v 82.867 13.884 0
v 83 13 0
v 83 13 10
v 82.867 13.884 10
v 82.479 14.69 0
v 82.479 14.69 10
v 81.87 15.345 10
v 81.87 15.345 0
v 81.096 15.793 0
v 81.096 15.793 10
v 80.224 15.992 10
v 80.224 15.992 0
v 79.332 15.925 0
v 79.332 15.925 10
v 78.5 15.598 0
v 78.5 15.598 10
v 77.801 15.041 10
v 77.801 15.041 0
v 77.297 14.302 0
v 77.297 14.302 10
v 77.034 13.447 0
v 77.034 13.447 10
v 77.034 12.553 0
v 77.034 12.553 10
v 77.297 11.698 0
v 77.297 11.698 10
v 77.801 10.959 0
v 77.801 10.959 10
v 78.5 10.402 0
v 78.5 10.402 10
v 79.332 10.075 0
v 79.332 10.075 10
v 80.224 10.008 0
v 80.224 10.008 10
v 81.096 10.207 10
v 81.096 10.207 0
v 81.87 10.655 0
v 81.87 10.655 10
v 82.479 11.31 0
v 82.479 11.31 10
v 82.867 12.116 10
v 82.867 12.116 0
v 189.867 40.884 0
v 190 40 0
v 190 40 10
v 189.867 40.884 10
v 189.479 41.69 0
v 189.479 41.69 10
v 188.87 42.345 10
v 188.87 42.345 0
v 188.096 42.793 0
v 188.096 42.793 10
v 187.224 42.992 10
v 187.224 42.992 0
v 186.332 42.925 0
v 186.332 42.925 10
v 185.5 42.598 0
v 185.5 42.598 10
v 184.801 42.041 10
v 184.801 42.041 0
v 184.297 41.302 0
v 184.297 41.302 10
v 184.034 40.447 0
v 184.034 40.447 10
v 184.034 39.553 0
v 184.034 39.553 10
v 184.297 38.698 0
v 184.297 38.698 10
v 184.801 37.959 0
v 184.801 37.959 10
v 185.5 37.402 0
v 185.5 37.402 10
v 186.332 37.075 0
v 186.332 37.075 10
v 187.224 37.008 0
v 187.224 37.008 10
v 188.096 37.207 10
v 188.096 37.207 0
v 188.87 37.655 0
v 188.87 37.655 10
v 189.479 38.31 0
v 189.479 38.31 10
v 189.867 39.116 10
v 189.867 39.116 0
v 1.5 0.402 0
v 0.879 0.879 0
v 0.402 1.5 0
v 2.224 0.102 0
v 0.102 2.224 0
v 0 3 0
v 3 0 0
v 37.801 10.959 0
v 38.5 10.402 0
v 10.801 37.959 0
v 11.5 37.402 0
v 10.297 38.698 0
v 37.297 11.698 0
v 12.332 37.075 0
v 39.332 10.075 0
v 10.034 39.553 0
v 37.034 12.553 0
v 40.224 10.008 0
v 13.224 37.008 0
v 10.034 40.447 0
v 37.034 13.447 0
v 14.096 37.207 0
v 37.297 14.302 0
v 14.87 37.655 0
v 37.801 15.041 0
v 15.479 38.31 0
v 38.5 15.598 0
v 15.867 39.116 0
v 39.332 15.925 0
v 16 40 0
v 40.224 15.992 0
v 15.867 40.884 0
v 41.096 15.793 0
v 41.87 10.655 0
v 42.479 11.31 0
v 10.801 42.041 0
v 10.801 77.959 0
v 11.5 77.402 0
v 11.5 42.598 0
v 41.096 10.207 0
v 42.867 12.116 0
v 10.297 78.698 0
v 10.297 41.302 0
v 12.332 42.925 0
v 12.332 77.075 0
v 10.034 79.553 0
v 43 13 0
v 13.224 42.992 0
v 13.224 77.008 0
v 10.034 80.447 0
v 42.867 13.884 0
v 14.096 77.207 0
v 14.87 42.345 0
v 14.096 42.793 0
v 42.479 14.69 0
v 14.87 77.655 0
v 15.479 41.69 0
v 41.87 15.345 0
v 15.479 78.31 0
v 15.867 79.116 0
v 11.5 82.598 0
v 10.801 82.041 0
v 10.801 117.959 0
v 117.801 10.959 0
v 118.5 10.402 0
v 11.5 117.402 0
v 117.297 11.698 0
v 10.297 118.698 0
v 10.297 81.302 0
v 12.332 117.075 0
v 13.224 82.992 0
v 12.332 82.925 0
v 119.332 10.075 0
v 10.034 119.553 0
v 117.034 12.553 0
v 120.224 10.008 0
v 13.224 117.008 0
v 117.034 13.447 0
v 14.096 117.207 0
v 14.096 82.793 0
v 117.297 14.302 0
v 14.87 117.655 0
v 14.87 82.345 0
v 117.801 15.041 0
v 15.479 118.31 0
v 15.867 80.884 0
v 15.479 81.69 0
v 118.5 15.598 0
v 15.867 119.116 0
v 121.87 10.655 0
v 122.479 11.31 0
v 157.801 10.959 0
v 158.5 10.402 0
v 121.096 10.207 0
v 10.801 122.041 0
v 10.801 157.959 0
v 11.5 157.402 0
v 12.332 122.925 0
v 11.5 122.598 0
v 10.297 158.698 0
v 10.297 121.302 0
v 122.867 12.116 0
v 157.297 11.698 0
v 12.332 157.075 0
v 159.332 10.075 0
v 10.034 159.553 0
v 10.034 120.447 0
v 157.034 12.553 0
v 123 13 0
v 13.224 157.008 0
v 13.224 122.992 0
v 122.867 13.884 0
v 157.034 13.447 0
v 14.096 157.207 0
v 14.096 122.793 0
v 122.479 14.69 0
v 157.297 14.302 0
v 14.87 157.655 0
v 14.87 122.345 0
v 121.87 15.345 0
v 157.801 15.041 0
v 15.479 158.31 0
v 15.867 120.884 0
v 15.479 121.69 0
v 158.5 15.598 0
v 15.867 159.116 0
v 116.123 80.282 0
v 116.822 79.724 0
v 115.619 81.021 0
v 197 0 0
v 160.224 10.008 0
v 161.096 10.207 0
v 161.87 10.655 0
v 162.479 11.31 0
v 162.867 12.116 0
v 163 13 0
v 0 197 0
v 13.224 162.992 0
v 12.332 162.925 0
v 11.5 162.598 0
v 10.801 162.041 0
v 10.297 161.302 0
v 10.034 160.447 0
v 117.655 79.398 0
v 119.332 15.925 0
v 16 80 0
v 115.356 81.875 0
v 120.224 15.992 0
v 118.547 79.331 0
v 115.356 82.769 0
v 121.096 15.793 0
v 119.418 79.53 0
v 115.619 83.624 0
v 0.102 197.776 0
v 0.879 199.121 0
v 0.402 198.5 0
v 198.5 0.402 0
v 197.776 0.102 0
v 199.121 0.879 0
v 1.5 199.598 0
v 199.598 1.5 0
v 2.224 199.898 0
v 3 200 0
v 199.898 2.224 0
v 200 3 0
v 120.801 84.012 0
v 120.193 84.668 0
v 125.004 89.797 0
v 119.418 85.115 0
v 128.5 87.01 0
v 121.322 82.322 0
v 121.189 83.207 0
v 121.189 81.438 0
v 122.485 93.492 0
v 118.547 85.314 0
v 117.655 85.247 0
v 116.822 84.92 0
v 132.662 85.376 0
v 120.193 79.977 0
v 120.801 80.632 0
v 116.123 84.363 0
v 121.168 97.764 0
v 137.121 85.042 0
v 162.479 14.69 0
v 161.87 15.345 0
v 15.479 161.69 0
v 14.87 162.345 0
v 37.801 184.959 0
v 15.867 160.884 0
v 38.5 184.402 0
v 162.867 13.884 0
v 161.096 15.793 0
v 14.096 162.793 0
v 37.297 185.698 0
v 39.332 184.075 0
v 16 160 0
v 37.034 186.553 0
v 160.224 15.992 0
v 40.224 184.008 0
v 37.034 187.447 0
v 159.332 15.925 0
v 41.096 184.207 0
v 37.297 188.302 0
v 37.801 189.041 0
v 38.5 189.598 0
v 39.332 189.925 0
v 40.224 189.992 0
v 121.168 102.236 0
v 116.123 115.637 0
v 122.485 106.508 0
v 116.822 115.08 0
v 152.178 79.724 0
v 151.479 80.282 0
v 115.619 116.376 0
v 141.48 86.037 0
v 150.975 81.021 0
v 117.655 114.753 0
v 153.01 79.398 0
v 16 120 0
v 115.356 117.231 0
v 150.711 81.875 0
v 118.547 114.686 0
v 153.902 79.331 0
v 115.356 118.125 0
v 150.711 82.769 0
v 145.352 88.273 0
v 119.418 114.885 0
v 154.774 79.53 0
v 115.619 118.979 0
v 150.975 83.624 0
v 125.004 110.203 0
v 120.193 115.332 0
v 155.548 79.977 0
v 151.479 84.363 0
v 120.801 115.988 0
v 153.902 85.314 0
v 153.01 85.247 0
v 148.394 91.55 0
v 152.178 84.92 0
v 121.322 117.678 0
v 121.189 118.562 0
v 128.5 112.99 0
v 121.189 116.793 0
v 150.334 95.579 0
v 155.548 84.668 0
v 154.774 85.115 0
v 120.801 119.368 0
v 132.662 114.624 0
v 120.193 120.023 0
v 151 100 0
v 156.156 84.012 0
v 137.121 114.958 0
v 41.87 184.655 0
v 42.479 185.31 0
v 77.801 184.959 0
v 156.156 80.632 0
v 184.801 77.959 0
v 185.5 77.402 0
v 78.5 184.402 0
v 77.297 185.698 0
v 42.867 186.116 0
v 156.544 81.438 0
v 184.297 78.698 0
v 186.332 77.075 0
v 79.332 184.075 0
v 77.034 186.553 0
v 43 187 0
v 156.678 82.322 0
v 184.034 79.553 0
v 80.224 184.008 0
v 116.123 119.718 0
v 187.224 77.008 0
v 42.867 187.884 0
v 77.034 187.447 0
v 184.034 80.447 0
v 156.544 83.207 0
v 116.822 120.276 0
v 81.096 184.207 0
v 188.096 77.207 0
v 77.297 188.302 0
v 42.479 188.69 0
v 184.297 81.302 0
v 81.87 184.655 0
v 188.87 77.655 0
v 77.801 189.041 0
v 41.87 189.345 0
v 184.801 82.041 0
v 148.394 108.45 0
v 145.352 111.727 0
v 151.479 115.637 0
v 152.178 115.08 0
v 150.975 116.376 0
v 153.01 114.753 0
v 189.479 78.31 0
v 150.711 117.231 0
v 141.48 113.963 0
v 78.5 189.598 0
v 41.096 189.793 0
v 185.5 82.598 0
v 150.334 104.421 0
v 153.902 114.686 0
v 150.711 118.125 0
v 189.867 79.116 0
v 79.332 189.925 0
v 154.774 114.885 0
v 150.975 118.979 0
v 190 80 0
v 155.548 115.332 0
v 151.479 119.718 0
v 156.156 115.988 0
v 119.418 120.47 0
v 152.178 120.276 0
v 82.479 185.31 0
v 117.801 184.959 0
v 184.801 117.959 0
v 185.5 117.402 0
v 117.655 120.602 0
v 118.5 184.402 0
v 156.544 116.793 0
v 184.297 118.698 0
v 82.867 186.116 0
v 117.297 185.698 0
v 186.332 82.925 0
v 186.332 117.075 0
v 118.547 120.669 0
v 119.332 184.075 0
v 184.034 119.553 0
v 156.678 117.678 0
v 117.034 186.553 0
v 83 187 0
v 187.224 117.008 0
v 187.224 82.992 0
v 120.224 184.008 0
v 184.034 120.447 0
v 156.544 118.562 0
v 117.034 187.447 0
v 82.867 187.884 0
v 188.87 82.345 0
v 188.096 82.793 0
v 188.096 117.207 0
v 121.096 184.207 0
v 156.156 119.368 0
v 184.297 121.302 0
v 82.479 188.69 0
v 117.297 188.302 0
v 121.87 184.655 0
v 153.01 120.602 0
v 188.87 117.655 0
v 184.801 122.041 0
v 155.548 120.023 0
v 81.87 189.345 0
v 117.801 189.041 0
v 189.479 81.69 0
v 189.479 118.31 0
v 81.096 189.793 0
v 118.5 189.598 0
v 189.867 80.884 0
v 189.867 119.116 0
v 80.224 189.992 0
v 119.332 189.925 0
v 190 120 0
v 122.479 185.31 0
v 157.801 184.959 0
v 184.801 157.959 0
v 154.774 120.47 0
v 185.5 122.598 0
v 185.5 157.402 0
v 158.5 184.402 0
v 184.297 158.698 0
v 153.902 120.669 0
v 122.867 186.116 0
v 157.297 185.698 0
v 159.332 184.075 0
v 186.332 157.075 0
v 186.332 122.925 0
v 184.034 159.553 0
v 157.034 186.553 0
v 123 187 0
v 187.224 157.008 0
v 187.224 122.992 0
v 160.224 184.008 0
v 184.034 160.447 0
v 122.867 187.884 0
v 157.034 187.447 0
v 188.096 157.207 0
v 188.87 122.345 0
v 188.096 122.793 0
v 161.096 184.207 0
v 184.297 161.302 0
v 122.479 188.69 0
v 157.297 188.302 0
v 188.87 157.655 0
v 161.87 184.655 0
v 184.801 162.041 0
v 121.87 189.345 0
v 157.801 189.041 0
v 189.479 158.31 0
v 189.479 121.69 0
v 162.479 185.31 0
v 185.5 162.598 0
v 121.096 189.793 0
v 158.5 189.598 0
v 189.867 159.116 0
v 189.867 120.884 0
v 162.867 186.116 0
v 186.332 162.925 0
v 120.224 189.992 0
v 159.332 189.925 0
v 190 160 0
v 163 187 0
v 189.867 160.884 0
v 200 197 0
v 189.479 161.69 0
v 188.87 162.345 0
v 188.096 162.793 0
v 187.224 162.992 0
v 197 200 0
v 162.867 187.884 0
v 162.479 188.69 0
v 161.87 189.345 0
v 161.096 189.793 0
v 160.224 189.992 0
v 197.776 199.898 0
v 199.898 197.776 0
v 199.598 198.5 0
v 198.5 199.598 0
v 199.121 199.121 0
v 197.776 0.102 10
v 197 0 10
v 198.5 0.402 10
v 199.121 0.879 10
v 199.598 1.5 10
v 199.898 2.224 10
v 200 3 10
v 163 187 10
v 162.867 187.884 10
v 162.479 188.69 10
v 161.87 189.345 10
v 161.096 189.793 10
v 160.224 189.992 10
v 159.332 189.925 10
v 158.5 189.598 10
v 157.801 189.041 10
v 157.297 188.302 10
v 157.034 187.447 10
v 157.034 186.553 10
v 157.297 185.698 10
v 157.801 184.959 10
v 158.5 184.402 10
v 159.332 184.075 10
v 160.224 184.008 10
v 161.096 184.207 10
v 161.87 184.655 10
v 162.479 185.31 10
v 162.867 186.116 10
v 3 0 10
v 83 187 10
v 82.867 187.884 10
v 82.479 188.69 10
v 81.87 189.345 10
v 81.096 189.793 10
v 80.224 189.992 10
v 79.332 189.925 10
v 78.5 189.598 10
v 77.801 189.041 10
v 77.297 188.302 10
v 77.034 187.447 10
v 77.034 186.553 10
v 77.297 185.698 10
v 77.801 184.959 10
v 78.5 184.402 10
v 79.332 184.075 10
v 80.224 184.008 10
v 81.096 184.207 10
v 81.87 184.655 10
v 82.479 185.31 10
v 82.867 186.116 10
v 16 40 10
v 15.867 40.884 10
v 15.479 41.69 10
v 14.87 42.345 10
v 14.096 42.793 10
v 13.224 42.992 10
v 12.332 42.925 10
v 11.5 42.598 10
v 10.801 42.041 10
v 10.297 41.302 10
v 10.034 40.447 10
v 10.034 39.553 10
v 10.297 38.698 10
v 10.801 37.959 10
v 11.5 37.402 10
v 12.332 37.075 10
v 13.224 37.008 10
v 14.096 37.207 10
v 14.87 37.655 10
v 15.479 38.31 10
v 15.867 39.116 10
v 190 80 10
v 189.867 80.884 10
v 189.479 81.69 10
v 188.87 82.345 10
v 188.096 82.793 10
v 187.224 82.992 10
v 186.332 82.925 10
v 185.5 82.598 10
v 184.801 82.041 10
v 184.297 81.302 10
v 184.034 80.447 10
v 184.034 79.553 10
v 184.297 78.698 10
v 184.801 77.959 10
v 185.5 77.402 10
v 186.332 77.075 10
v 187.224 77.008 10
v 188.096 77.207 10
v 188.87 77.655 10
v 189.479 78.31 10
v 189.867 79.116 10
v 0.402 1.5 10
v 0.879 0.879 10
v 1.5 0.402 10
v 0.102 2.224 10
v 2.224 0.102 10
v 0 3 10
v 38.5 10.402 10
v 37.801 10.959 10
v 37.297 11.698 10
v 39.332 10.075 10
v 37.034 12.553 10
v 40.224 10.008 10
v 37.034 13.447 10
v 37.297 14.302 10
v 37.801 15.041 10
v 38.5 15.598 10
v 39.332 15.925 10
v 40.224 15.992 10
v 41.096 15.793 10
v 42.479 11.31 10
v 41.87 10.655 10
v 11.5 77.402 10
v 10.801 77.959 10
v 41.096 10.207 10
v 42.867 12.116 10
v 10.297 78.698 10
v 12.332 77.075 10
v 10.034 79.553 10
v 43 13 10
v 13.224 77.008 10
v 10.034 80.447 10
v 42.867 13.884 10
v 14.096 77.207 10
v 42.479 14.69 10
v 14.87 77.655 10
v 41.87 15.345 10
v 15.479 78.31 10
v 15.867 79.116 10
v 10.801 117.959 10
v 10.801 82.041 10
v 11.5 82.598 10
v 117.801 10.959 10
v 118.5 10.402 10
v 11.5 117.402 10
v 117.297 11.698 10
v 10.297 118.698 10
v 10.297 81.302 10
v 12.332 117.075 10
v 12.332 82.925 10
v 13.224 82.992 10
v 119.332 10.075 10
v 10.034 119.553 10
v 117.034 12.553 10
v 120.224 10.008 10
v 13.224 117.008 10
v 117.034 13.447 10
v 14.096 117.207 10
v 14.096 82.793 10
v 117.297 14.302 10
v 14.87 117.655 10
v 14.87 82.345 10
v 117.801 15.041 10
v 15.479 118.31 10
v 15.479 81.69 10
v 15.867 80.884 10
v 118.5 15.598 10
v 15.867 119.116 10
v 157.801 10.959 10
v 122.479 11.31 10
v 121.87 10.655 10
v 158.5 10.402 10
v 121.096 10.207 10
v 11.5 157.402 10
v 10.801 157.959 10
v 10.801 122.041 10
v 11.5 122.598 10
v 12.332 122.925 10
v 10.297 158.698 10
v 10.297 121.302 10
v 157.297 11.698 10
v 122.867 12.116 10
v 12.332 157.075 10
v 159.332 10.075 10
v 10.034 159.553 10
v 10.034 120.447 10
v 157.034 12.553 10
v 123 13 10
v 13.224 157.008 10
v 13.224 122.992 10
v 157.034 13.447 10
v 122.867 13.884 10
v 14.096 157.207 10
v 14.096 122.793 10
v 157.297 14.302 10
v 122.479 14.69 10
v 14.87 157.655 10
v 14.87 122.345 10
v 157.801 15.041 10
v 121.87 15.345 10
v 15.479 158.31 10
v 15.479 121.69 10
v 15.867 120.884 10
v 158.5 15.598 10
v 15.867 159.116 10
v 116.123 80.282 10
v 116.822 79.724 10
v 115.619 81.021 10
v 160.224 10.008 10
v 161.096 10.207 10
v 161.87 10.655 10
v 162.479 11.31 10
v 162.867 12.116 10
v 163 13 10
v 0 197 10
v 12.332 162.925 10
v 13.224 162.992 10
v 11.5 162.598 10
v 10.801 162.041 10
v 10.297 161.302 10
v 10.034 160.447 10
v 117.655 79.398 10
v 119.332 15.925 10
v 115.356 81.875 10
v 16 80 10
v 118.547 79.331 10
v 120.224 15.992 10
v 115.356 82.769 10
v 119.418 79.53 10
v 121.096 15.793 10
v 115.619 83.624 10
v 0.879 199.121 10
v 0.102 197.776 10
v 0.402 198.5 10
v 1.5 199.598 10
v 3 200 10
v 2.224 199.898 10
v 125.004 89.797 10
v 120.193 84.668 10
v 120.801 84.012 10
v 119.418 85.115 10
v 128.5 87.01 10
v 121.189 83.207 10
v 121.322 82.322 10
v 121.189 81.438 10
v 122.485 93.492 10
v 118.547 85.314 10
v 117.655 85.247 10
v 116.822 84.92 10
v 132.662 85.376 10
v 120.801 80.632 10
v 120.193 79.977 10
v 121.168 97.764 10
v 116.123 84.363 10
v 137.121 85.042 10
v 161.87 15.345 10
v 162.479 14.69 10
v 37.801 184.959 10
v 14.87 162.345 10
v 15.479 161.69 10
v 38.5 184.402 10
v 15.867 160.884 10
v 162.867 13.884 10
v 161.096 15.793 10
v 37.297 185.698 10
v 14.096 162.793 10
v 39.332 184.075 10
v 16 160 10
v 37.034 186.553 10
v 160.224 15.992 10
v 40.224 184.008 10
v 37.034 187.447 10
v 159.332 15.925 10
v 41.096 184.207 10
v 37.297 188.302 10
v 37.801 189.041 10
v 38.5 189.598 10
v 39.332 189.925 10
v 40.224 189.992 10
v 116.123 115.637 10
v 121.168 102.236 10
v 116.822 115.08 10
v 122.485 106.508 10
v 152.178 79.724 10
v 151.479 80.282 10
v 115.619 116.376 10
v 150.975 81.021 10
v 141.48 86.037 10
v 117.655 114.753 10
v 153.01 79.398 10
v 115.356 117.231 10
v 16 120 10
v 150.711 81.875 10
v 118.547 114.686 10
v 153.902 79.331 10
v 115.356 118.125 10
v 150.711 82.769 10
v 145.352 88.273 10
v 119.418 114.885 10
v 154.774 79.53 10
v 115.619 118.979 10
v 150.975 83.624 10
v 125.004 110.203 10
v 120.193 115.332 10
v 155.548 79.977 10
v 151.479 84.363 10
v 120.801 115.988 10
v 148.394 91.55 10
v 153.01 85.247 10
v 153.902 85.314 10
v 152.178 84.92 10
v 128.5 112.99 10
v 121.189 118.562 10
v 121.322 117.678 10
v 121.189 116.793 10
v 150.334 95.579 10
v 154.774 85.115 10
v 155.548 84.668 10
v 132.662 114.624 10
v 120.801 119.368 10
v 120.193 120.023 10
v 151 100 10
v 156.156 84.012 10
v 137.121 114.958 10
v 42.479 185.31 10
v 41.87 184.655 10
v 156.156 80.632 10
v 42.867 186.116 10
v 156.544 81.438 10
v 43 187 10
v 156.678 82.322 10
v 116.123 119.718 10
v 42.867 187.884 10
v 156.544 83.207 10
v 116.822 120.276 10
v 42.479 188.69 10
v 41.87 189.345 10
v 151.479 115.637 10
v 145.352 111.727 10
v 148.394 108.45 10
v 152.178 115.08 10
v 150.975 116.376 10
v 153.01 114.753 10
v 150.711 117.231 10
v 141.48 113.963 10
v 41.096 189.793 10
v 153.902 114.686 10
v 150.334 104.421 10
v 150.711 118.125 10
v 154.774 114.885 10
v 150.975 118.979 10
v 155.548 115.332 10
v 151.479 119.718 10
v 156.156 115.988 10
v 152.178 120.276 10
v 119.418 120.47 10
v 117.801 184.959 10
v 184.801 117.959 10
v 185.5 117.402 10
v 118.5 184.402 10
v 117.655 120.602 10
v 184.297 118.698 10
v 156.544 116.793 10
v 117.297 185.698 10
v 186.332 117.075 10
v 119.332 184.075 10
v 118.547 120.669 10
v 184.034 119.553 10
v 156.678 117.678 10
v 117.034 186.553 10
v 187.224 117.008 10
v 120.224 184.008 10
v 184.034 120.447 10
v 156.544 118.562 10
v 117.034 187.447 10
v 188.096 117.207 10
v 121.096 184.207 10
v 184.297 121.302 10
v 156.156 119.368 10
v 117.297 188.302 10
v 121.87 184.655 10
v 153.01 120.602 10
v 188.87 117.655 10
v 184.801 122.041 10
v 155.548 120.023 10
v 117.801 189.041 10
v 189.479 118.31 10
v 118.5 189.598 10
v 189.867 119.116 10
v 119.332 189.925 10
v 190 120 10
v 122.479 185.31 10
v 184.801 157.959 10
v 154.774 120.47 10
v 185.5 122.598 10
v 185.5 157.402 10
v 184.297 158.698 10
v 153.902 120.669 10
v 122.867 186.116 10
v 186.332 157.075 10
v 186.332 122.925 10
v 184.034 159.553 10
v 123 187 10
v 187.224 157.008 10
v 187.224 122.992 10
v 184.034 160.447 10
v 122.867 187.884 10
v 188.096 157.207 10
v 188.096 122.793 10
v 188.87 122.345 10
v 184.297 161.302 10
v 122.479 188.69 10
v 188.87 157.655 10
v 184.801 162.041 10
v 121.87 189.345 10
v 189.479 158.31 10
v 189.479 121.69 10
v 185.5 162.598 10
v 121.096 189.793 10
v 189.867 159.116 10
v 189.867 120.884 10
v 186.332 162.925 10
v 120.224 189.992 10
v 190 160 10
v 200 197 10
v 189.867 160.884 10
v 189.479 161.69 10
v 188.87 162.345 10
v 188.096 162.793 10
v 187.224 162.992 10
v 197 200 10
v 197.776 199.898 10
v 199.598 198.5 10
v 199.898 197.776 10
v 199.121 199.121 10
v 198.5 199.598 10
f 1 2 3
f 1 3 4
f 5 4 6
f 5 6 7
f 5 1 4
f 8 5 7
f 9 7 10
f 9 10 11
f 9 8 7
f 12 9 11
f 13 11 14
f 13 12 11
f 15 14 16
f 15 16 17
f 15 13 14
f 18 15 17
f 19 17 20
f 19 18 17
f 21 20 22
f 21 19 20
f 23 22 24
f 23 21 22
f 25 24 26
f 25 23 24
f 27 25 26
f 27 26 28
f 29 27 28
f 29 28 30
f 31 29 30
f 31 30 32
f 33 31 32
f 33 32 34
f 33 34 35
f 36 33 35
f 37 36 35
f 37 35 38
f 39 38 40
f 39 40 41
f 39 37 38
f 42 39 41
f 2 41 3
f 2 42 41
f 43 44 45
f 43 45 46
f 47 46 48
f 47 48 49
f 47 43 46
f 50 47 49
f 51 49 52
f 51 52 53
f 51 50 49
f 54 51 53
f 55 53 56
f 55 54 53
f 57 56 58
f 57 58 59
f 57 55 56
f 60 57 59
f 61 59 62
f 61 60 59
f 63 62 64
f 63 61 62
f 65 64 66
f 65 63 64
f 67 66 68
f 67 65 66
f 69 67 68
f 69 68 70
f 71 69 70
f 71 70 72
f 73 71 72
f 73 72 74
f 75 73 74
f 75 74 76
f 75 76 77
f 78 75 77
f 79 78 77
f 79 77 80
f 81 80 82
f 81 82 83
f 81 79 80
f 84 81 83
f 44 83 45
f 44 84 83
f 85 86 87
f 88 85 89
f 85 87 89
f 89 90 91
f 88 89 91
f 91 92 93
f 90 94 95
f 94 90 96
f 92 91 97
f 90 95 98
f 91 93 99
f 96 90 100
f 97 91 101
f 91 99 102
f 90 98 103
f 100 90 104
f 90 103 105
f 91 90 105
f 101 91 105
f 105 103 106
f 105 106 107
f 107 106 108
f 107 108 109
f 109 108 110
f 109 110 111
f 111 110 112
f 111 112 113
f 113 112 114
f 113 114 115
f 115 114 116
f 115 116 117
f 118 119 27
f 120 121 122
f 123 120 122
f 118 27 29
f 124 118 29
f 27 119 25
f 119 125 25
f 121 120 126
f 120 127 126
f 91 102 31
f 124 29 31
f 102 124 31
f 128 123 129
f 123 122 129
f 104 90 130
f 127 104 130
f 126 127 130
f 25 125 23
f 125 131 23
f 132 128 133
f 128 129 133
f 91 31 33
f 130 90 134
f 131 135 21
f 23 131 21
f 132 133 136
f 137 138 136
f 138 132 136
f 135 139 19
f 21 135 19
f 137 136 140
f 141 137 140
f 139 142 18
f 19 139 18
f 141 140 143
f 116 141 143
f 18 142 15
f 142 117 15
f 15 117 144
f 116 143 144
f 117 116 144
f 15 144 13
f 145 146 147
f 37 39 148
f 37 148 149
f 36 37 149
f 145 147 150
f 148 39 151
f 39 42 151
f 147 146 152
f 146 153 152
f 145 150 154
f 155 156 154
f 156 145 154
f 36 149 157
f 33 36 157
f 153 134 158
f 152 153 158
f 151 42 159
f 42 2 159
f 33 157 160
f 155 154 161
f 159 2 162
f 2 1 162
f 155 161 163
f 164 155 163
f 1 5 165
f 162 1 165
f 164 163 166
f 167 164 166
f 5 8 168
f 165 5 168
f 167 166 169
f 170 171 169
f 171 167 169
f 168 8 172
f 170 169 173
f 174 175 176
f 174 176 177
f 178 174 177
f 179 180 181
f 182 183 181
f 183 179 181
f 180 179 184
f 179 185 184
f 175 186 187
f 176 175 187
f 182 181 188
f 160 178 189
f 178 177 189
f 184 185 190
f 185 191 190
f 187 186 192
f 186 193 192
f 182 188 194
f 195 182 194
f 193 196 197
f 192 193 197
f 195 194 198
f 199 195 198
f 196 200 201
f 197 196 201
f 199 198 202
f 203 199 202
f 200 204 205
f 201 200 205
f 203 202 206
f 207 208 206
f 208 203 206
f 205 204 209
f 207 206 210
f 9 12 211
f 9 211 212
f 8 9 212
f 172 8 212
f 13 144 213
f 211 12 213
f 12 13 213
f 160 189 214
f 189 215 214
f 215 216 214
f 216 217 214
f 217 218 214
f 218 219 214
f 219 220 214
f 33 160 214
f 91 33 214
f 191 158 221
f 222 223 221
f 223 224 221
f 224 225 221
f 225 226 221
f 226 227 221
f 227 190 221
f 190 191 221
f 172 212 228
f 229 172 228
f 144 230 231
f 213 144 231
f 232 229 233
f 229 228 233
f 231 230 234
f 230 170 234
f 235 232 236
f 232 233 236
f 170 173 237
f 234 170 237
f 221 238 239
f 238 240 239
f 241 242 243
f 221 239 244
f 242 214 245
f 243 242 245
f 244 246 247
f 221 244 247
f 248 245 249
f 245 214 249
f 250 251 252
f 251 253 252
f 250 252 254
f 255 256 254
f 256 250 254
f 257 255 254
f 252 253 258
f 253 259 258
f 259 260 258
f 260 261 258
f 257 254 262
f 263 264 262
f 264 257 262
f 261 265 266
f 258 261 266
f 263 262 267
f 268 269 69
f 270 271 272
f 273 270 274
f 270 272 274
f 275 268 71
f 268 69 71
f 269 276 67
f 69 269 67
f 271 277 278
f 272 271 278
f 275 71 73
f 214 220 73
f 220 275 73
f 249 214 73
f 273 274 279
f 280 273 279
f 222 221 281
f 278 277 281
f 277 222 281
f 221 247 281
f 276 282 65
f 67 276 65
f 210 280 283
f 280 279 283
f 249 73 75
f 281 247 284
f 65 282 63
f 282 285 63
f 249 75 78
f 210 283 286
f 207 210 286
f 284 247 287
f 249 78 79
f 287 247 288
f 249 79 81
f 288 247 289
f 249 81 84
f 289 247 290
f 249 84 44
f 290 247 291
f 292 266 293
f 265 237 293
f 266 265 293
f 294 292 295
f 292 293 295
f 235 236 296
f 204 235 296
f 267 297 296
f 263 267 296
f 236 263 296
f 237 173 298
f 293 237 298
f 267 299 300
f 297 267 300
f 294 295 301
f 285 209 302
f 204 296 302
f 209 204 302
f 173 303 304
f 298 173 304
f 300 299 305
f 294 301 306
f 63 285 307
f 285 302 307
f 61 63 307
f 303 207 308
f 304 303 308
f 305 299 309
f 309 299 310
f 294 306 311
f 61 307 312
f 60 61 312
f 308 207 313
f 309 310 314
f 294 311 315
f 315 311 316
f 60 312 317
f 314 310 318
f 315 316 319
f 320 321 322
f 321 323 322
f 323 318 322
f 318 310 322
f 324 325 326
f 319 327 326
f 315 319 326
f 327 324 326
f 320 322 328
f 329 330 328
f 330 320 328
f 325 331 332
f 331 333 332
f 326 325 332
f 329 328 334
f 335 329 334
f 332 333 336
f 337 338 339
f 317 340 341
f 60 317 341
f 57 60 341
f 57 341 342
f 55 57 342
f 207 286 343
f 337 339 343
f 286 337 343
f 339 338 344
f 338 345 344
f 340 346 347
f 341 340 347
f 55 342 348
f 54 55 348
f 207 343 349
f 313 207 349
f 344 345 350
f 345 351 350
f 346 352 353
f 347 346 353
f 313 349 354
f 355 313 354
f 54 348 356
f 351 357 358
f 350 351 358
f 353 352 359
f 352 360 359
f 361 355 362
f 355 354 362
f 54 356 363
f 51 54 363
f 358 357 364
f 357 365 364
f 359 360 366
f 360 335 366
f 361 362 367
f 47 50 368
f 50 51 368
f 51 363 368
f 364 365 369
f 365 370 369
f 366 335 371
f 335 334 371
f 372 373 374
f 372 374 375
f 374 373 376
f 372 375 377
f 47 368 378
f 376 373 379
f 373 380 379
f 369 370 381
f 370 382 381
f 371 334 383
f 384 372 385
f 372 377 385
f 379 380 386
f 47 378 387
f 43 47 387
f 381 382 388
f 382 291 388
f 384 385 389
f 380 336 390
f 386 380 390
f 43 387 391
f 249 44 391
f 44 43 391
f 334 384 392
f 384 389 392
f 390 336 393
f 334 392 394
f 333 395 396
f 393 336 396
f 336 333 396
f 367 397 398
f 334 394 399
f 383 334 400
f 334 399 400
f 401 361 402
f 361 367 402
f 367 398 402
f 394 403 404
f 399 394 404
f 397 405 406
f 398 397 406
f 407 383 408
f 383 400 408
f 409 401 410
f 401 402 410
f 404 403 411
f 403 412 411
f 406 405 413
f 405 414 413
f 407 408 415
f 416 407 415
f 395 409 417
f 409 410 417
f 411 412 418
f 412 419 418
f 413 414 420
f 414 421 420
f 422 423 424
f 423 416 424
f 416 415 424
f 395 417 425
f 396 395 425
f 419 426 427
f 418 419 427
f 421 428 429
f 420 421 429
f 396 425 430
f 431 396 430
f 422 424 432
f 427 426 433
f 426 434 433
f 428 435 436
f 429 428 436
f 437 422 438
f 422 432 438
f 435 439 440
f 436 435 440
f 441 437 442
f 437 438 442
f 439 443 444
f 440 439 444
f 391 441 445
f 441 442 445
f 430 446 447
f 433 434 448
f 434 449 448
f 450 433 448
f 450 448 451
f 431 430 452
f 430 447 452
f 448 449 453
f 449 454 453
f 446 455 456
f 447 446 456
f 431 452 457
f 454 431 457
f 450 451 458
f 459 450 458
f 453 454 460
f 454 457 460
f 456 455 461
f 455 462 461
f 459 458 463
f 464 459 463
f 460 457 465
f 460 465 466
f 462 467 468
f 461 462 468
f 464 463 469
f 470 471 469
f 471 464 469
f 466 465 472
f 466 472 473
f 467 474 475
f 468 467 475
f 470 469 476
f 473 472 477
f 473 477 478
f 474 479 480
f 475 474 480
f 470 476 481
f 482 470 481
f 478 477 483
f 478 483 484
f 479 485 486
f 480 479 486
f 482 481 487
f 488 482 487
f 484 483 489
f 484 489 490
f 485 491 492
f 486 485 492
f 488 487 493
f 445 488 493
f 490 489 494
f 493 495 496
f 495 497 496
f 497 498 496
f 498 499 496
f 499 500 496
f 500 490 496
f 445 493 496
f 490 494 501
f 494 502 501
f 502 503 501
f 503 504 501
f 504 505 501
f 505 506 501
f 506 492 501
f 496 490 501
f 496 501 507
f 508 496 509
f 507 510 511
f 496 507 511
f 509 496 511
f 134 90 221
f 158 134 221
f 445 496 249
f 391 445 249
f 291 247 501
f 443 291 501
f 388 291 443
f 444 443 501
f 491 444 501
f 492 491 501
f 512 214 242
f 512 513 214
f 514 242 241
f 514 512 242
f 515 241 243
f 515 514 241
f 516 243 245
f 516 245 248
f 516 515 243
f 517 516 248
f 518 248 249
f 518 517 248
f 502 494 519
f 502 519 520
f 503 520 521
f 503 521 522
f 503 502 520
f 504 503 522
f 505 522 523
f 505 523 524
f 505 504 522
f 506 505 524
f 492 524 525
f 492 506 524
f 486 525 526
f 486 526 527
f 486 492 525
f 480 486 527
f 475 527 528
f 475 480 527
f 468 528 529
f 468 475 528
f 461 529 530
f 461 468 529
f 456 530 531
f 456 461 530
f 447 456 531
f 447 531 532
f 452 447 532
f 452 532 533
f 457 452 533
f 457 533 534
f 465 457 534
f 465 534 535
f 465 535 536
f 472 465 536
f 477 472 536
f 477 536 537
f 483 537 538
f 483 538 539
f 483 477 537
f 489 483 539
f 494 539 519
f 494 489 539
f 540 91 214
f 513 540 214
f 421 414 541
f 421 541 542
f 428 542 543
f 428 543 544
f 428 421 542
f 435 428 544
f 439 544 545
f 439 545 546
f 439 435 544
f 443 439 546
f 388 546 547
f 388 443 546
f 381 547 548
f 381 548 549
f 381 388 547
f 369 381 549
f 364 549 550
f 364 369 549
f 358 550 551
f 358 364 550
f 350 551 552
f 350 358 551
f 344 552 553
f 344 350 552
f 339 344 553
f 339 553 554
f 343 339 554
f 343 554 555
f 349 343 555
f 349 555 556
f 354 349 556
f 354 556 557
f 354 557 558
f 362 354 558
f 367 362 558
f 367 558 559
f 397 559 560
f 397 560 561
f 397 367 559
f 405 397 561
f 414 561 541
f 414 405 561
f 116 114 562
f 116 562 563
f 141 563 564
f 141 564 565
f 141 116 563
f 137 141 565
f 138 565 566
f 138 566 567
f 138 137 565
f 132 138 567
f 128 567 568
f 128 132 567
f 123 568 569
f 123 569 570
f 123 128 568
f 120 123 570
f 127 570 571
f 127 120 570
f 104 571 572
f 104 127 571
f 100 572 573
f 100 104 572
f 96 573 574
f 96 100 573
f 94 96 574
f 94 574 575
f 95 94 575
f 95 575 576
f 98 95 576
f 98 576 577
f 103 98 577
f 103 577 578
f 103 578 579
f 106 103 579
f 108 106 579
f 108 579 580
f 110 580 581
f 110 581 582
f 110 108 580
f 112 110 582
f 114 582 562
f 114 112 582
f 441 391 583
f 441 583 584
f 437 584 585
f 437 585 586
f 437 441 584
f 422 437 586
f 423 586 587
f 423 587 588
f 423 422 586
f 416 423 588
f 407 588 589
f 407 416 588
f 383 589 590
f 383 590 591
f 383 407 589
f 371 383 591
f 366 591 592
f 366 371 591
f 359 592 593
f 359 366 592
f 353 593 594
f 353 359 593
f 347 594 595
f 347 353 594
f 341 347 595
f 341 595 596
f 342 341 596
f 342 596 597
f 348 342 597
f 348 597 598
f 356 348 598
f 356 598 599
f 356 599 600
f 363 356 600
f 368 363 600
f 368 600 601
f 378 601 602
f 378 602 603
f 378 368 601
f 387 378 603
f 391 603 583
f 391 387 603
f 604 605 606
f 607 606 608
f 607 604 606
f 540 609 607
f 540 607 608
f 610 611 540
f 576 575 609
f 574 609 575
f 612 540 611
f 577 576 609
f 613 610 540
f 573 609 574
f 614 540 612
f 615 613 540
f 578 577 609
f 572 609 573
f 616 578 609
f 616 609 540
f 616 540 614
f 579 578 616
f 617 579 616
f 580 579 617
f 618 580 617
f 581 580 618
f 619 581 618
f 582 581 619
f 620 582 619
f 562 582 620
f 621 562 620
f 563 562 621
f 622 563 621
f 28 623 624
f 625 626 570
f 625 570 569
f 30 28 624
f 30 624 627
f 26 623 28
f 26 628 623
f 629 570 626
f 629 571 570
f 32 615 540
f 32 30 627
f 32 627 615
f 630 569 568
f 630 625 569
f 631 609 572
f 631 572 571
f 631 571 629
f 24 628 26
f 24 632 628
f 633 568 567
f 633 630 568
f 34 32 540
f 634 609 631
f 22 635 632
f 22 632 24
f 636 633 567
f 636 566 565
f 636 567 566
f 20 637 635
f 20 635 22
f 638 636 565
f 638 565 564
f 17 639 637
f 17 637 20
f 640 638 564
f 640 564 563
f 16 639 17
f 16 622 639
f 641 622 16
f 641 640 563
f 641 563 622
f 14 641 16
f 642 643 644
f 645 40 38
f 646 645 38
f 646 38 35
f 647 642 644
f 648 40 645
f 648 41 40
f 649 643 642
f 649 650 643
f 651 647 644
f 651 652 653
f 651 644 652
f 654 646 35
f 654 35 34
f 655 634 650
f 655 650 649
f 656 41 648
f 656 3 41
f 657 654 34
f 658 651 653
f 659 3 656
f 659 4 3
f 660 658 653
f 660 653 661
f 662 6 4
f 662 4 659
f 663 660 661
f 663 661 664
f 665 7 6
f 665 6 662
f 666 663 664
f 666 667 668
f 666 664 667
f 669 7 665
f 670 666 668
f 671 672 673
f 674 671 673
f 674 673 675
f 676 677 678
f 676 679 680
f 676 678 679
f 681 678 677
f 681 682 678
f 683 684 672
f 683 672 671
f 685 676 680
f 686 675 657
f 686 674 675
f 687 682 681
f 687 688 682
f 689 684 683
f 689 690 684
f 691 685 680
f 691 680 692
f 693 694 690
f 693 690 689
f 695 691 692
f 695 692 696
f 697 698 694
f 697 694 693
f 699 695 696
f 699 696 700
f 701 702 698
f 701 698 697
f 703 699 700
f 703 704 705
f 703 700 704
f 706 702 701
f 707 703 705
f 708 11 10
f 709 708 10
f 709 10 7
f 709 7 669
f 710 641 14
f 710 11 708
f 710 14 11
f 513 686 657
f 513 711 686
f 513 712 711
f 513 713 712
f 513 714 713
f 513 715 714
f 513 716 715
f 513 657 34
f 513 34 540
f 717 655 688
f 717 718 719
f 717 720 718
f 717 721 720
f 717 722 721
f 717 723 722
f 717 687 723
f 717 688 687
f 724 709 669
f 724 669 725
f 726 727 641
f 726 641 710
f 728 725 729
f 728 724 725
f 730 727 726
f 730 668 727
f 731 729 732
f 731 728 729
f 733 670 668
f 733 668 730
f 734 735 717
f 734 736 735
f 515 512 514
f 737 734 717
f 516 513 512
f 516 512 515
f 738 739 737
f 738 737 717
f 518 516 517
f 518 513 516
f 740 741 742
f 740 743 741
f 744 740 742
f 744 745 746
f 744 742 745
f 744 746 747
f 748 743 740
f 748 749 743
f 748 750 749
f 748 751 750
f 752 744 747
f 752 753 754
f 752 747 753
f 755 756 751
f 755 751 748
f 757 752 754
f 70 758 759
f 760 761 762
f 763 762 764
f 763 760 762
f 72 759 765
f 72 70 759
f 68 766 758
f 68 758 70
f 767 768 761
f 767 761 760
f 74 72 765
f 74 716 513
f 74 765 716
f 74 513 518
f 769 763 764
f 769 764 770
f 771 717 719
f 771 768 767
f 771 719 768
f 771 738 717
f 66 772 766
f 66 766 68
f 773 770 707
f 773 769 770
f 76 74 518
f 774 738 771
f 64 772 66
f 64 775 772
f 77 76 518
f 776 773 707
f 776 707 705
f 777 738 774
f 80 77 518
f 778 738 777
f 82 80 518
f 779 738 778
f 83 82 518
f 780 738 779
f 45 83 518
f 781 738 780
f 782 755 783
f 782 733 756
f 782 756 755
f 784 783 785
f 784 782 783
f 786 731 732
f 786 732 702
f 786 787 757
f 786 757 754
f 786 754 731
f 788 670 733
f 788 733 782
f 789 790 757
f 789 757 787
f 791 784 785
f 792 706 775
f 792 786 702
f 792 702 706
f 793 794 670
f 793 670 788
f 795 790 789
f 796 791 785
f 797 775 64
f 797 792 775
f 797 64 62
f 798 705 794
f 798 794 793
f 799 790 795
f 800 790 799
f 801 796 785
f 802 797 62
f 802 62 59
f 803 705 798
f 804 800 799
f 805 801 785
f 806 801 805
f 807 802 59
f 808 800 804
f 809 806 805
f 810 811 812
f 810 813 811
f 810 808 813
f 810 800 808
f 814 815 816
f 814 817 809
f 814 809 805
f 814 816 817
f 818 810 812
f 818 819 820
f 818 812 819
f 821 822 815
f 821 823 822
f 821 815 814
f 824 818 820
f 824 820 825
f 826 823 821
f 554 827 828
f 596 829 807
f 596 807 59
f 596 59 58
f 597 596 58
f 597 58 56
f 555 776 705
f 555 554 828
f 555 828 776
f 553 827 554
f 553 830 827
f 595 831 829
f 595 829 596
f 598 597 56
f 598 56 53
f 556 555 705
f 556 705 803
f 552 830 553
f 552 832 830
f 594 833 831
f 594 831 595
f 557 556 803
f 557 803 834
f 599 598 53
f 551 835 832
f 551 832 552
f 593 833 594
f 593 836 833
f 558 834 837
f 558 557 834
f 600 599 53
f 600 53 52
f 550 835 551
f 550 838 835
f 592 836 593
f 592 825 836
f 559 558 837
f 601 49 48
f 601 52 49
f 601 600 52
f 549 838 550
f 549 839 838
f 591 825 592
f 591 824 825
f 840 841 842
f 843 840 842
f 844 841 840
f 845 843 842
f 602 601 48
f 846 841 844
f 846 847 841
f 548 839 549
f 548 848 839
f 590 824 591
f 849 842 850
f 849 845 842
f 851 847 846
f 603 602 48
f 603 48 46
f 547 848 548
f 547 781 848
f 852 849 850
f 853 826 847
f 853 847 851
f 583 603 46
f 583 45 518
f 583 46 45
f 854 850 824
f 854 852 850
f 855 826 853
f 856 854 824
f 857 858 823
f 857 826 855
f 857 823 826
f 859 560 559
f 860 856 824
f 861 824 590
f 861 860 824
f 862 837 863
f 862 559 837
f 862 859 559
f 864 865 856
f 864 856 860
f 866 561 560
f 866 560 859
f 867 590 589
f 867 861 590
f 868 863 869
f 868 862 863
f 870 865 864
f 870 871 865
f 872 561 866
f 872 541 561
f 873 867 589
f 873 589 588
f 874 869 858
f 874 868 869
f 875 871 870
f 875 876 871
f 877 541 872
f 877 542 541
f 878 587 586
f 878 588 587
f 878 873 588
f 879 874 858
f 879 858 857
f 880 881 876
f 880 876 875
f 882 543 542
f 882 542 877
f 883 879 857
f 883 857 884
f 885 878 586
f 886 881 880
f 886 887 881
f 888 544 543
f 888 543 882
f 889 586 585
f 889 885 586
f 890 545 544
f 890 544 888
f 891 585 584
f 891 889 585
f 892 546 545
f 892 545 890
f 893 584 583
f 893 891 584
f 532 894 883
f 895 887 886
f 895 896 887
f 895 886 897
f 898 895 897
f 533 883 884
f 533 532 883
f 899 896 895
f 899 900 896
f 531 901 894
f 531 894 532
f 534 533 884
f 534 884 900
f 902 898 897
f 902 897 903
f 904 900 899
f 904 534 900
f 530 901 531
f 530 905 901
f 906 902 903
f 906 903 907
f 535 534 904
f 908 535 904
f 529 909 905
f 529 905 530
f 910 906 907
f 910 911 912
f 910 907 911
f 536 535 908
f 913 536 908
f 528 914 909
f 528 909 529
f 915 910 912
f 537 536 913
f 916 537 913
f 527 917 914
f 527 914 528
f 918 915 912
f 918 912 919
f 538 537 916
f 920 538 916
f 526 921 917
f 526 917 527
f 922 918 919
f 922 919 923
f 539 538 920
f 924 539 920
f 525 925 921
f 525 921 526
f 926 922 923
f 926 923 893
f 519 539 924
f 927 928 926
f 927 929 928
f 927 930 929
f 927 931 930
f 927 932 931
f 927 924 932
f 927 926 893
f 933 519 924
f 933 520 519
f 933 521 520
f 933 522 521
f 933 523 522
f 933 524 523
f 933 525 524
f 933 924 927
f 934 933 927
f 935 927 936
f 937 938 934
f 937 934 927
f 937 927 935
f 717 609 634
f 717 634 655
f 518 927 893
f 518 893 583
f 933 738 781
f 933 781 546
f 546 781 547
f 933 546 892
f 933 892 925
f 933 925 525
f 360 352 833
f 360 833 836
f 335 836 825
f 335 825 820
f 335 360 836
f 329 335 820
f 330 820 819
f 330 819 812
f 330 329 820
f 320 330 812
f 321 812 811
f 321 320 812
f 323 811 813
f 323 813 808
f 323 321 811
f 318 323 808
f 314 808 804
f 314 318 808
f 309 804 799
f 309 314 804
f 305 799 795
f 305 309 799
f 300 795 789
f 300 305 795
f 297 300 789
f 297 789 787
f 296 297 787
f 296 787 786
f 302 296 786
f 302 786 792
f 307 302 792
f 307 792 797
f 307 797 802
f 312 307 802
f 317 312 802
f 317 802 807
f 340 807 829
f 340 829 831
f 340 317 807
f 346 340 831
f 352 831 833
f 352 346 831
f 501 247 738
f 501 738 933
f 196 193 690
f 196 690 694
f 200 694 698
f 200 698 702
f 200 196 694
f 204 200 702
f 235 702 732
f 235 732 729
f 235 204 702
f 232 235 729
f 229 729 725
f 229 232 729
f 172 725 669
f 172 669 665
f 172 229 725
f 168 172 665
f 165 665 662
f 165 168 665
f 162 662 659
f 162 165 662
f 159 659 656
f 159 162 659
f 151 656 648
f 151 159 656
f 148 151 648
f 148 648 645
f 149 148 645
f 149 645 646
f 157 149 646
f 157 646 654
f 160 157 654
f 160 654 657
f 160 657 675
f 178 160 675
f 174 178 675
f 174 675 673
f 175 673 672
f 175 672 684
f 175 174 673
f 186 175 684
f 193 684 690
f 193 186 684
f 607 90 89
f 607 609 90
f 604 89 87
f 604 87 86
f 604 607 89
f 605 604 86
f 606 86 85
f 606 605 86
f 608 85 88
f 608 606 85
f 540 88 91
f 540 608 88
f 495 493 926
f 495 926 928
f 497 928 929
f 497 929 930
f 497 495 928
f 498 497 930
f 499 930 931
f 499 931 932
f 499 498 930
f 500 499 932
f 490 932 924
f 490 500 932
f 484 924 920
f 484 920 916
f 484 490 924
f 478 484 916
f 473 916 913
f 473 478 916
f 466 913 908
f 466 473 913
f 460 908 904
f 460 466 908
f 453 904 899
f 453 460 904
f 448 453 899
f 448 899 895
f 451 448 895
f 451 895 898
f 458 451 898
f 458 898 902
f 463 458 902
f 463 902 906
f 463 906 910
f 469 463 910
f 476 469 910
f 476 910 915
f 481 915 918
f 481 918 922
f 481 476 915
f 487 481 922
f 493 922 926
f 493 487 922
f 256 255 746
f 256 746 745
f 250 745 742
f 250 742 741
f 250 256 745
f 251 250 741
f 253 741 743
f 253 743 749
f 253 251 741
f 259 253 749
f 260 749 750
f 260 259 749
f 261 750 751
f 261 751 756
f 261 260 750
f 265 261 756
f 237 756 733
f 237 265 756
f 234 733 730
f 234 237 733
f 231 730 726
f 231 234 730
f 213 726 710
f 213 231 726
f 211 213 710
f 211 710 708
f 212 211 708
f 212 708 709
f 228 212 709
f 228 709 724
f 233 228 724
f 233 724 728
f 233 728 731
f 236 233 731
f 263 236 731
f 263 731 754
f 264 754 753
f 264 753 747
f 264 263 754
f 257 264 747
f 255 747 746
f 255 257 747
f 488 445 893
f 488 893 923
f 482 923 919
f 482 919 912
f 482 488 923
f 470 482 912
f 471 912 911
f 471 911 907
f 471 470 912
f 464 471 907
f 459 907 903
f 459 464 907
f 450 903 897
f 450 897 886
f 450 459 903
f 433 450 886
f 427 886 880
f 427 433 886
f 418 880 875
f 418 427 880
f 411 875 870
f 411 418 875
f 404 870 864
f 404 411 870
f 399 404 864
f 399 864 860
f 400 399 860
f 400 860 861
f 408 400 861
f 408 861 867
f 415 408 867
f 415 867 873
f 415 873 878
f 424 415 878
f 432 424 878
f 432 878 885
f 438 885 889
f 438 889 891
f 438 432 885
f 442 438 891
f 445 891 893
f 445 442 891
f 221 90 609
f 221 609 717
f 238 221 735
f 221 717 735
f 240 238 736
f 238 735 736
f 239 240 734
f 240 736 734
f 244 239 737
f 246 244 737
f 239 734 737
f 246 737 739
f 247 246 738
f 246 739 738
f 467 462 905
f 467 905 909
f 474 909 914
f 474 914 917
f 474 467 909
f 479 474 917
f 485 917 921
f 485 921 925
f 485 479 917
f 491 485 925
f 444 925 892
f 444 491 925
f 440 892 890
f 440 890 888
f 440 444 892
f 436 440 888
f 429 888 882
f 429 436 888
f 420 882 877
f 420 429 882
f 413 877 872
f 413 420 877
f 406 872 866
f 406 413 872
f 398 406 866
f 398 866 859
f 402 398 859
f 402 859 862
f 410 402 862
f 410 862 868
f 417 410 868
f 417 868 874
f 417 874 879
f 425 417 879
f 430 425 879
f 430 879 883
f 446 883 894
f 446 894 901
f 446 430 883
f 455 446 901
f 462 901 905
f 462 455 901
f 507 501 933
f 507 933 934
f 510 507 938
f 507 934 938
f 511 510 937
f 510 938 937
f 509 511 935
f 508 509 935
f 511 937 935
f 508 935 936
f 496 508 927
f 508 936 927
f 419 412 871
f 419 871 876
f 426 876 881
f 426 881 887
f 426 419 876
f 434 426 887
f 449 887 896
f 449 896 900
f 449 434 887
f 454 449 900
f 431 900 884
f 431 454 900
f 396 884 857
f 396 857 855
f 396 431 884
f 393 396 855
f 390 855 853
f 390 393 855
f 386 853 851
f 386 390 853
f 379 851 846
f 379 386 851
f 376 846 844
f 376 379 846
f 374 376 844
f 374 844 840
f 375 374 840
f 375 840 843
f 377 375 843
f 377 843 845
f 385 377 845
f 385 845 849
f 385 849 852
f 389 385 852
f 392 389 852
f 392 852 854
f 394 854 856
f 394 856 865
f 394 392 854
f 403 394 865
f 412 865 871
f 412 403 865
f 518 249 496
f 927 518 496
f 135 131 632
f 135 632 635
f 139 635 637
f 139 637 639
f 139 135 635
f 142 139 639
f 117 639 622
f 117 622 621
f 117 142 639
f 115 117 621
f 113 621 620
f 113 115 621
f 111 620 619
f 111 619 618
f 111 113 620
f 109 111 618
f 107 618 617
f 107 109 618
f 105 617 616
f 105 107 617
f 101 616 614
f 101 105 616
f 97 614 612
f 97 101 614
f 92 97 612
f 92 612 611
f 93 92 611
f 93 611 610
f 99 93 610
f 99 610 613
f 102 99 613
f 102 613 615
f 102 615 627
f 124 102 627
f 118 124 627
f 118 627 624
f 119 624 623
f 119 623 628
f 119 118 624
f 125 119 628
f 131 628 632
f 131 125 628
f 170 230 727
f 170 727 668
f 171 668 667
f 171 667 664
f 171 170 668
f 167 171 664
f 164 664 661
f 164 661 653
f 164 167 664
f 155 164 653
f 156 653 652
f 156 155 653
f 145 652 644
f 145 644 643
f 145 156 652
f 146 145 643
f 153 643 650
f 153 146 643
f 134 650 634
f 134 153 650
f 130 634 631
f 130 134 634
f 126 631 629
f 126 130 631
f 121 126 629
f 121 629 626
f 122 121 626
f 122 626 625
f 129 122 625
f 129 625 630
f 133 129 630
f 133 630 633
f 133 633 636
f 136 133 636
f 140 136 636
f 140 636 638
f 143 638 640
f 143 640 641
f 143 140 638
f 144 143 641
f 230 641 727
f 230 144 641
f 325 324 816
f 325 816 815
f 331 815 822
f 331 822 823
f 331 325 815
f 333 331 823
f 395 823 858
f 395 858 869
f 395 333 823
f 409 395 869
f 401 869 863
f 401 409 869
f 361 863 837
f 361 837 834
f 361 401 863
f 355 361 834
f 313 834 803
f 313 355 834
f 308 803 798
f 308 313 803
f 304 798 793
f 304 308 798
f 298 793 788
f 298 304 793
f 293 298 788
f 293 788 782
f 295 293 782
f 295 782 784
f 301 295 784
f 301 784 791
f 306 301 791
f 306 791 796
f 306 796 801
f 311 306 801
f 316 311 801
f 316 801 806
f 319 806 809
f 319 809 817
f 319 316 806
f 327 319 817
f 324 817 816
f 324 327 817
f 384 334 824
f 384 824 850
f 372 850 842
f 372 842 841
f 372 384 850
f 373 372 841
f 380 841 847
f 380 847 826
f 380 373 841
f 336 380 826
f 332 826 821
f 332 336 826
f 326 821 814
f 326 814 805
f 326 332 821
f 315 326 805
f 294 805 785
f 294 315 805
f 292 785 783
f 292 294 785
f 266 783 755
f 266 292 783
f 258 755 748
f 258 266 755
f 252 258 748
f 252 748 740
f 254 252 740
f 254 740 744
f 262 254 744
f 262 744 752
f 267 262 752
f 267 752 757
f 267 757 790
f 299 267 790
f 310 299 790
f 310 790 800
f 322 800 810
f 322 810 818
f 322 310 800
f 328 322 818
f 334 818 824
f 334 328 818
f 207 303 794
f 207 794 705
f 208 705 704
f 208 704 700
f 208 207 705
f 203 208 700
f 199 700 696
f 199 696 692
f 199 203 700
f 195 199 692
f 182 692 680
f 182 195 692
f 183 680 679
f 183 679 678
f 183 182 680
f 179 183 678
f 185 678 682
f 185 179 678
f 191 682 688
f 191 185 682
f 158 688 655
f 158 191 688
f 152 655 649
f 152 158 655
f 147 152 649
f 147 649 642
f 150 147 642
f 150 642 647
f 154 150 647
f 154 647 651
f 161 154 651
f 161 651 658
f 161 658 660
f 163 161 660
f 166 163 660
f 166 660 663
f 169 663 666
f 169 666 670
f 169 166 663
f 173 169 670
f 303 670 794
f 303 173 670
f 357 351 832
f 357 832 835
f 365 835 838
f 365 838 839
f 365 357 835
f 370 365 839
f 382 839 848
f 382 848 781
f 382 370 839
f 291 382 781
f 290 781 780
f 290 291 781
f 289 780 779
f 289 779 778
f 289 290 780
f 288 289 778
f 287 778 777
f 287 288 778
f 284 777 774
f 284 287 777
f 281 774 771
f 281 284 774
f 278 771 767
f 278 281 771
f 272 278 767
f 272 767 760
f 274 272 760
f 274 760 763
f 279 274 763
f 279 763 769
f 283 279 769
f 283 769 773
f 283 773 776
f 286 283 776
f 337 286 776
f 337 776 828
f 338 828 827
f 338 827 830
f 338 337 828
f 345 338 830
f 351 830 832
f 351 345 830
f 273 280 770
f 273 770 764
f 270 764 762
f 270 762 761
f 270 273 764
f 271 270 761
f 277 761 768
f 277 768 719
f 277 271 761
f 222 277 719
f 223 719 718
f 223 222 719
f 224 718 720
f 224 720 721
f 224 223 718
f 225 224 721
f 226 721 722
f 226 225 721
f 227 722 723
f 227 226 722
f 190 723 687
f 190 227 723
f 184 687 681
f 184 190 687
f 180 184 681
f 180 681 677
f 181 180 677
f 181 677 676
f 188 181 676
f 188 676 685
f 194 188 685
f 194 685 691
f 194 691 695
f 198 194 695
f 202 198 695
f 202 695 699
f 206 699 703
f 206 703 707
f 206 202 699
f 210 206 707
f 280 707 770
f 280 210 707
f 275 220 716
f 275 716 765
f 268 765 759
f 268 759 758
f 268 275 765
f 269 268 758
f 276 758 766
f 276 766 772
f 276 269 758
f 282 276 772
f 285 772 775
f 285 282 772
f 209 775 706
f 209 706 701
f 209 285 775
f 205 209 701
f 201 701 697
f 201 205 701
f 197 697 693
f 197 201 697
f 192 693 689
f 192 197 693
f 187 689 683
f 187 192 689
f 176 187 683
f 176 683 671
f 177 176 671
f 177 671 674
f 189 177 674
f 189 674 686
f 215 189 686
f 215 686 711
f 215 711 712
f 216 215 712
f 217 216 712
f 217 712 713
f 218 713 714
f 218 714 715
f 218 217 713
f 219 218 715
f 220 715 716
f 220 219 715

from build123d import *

# Parameters (mm, degrees)
SKETCH_W   = 200
SKETCH_H   = 200
SKETCH_R   = 15
SKETCH_R_2 = 3
PAD_DEPTH  = 10
FILLET_R   = 3


with BuildPart() as part:
    # Sketch → Pad (new body)
    with BuildSketch(Plane.XY):
        with Locations((100, 100)):
            Rectangle(SKETCH_W, SKETCH_H)
        with Locations((136, 100)):
            Circle(SKETCH_R, mode=Mode.SUBTRACT)
        with Locations((118.32233, 117.67767)):
            Circle(SKETCH_R_2, mode=Mode.SUBTRACT)
        with Locations((153.67767, 117.67767)):
            Circle(SKETCH_R_2, mode=Mode.SUBTRACT)
        with Locations((118.32233, 82.32233)):
            Circle(SKETCH_R_2, mode=Mode.SUBTRACT)
        with Locations((153.67767, 82.32233)):
            Circle(SKETCH_R_2, mode=Mode.SUBTRACT)
        with Locations((40, 13)):
            Circle(SKETCH_R_2, mode=Mode.SUBTRACT)
        with Locations((160, 13)):
            Circle(SKETCH_R_2, mode=Mode.SUBTRACT)
        with Locations((80, 13)):
            Circle(SKETCH_R_2, mode=Mode.SUBTRACT)
        with Locations((120, 13)):
            Circle(SKETCH_R_2, mode=Mode.SUBTRACT)
        with Locations((40, 187)):
            Circle(SKETCH_R_2, mode=Mode.SUBTRACT)
        with Locations((80, 187)):
            Circle(SKETCH_R_2, mode=Mode.SUBTRACT)
        with Locations((120, 187)):
            Circle(SKETCH_R_2, mode=Mode.SUBTRACT)
        with Locations((160, 187)):
            Circle(SKETCH_R_2, mode=Mode.SUBTRACT)
        with Locations((13, 160)):
            Circle(SKETCH_R_2, mode=Mode.SUBTRACT)
        with Locations((13, 120)):
            Circle(SKETCH_R_2, mode=Mode.SUBTRACT)
        with Locations((13, 80)):
            Circle(SKETCH_R_2, mode=Mode.SUBTRACT)
        with Locations((13, 40)):
            Circle(SKETCH_R_2, mode=Mode.SUBTRACT)
        with Locations((187, 160)):
            Circle(SKETCH_R_2, mode=Mode.SUBTRACT)
        with Locations((187, 120)):
            Circle(SKETCH_R_2, mode=Mode.SUBTRACT)
        with Locations((187, 80)):
            Circle(SKETCH_R_2, mode=Mode.SUBTRACT)
        with Locations((187, 40)):
            Circle(SKETCH_R_2, mode=Mode.SUBTRACT)
    extrude(amount=PAD_DEPTH)

    # Fillet
    fillet_edges = [part.edges().sort_by_distance(p)[0] for p in [
        (0, 0, 5),
        (200, 0, 5),
        (0, 200, 5),
        (200, 200, 5),
    ]]
    fillet(fillet_edges, radius=FILLET_R)


solid = part.part
